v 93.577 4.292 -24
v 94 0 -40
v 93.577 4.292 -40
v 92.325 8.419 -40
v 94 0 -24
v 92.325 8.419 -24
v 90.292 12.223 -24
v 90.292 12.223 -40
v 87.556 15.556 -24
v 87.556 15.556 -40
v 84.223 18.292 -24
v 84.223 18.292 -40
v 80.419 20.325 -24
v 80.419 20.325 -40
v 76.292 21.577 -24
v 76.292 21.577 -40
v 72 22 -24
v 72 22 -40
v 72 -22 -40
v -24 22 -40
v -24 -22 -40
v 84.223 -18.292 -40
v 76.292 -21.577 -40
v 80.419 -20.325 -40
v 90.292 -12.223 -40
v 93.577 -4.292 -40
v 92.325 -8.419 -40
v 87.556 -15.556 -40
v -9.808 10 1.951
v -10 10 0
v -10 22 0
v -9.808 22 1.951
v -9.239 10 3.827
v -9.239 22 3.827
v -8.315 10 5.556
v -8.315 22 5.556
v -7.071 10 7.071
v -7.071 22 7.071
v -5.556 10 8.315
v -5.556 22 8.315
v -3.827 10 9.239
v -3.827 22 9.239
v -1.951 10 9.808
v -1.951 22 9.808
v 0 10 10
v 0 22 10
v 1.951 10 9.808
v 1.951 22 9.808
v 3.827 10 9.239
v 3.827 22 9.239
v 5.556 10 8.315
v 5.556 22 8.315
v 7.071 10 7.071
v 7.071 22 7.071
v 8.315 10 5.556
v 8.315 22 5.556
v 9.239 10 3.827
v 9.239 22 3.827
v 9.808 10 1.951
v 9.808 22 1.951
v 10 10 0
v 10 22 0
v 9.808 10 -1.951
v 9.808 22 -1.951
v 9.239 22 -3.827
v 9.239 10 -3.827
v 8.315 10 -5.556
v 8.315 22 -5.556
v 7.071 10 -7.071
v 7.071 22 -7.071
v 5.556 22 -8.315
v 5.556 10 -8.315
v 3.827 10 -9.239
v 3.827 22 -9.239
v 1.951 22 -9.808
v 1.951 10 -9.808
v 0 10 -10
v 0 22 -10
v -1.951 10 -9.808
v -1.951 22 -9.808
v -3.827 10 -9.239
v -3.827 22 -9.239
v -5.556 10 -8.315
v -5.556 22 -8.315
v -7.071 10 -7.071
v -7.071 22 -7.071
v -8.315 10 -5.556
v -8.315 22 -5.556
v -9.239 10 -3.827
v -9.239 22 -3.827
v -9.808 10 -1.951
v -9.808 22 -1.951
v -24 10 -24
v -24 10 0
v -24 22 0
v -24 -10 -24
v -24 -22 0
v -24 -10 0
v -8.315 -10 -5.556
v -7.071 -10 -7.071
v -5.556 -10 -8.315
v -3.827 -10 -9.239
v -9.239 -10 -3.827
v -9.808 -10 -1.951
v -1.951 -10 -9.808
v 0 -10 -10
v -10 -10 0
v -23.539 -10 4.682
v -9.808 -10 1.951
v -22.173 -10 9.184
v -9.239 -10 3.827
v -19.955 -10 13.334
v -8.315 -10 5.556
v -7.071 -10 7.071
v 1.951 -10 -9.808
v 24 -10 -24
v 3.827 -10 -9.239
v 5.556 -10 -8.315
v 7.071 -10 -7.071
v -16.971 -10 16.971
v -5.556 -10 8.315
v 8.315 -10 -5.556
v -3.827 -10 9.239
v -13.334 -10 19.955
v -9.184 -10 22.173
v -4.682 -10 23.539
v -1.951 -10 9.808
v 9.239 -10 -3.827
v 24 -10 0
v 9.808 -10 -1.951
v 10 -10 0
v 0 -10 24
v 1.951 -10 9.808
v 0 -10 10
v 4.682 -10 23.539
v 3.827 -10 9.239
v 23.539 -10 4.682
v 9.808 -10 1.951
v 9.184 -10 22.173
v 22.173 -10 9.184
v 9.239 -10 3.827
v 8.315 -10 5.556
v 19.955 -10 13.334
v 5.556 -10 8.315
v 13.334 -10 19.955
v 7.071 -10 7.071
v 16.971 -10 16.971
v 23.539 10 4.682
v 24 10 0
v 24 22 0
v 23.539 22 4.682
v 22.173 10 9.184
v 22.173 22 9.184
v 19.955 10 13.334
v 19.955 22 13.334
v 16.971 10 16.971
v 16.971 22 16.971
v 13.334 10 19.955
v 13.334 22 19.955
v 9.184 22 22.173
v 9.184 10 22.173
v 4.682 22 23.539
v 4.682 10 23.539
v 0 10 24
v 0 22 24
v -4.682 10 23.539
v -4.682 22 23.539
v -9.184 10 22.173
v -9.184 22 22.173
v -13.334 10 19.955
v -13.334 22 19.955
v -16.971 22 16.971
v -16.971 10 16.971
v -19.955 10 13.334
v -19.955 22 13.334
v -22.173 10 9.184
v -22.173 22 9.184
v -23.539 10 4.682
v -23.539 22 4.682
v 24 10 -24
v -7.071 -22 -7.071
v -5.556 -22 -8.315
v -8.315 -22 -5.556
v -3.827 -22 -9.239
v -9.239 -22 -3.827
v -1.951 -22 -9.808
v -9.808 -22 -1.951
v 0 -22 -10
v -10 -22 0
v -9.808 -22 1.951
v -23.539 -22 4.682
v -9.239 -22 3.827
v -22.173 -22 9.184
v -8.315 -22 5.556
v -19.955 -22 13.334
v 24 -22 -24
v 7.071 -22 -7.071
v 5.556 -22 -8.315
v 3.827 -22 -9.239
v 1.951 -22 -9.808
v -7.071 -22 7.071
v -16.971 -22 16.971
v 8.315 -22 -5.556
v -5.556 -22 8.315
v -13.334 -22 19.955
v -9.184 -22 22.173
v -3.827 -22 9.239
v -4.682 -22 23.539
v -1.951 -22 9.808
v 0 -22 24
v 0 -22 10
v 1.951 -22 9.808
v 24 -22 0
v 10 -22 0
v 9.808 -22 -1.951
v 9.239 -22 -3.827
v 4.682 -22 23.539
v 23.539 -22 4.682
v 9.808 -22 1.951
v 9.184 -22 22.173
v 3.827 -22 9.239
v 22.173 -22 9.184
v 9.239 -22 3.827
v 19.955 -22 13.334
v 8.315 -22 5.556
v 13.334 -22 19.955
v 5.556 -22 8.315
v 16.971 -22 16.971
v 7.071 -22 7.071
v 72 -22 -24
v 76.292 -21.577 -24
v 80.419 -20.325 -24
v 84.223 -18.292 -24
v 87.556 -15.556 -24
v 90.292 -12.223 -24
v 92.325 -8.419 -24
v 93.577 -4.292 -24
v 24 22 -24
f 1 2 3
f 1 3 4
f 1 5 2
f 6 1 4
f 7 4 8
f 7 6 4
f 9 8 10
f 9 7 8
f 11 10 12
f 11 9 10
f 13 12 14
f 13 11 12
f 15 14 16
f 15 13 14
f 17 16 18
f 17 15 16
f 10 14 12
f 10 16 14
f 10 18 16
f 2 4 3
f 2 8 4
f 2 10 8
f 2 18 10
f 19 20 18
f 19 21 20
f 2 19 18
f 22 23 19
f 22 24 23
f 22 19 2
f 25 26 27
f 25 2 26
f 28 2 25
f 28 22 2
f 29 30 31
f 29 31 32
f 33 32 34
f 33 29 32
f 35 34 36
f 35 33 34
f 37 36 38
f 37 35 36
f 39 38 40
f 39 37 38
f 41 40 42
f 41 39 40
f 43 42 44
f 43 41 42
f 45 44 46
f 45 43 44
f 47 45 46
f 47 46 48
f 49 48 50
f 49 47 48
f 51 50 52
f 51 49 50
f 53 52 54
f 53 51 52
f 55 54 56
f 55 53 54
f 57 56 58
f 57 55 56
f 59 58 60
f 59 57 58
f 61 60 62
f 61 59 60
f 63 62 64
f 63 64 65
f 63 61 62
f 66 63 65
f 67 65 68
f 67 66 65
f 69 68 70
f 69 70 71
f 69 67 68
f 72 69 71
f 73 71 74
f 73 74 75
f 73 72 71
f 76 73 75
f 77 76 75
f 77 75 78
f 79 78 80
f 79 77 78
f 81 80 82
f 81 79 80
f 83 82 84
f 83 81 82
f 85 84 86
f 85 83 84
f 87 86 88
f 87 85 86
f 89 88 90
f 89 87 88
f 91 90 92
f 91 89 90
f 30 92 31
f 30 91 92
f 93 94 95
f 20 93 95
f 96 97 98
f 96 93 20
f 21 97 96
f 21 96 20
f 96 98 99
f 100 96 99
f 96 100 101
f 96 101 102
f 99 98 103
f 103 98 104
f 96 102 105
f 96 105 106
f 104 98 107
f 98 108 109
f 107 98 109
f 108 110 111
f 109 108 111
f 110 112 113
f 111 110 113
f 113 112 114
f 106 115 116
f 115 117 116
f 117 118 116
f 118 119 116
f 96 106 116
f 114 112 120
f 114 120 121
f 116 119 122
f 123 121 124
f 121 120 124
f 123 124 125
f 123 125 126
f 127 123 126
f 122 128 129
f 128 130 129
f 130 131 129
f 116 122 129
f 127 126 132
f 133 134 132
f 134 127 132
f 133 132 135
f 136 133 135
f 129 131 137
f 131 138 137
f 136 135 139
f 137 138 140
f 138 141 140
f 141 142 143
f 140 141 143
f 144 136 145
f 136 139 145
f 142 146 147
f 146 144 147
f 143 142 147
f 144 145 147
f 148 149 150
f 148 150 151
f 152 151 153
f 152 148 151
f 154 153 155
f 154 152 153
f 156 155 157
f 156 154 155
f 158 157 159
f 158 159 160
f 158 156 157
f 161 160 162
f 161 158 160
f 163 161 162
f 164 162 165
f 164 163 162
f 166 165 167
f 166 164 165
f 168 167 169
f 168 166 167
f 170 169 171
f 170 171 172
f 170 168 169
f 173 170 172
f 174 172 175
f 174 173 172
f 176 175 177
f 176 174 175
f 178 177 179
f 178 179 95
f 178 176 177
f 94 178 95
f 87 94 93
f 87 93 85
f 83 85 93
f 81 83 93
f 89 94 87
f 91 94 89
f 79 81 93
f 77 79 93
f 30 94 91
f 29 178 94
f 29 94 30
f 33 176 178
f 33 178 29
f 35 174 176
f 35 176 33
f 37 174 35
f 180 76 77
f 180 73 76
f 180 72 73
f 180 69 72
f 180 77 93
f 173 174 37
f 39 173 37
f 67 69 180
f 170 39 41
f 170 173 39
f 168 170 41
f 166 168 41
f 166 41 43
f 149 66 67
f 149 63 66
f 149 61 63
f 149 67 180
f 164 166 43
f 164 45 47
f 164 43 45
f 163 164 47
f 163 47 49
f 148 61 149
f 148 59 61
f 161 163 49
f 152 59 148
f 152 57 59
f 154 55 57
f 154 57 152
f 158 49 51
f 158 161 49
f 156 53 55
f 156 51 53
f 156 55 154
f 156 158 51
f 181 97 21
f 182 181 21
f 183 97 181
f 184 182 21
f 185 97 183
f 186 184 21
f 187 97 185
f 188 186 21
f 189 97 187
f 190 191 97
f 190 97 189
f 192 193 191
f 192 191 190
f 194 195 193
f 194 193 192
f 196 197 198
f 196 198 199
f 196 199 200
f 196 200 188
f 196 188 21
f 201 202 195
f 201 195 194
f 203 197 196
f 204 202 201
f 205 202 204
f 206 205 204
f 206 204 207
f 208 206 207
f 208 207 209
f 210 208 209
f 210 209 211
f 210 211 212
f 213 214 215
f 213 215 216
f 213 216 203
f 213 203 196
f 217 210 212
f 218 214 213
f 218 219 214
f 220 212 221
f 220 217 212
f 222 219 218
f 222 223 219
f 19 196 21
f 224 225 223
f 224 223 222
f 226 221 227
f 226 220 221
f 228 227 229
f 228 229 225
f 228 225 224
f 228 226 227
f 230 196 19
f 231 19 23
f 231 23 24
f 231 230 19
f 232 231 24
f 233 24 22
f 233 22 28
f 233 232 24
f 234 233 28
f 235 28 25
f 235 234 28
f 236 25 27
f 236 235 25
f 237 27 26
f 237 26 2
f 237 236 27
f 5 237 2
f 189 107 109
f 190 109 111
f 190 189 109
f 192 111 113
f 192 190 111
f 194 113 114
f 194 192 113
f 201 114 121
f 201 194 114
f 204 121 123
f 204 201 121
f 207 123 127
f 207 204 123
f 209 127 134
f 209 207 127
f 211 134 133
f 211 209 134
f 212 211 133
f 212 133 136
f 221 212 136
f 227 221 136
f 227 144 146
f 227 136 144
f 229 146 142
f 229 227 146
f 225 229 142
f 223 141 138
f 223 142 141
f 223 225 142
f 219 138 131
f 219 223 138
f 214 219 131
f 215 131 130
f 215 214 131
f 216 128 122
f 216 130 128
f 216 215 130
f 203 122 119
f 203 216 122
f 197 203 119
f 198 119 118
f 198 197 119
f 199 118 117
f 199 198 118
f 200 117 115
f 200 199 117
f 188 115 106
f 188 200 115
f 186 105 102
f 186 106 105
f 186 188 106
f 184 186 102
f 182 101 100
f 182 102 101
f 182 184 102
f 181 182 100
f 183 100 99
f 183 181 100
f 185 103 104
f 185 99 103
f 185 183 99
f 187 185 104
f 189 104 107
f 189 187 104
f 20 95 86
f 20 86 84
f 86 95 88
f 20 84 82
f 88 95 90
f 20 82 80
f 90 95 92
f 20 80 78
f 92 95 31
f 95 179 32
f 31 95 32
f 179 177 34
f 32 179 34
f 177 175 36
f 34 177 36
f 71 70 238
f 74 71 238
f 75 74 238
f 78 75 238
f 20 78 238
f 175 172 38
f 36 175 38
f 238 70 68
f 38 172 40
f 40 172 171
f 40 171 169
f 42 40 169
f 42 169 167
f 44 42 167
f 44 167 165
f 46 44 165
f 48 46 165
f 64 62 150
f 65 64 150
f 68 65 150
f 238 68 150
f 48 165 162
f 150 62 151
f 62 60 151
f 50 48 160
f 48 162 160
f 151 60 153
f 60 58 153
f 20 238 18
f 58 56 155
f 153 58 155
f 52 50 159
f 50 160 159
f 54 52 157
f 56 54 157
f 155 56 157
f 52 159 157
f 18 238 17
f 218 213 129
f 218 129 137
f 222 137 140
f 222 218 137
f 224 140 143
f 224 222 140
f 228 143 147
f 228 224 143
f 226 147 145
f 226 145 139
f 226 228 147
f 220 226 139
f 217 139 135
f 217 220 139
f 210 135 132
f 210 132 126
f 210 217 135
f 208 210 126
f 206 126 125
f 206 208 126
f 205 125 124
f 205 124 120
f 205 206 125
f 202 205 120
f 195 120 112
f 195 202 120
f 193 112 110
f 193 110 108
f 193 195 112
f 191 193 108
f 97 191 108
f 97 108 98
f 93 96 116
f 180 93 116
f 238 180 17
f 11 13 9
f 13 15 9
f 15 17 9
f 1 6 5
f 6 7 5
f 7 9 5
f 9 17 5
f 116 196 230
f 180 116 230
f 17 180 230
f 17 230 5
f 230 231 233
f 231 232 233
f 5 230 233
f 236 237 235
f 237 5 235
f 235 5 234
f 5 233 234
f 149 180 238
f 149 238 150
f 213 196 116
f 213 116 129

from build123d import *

# Parameters (mm, degrees)
F0_W          = 70
F0_H          = 16
F1_DEPTH      = 22
F1_DEPTH_BACK = 22
F2_DEPTH      = 10
F2_DEPTH_BACK = 10
F3_R          = 21.99999


# Not quite as in the source:
# - a fillet or chamfer is up to 0.001 mm smaller than in the source, because OpenCascade refuses the exact size


with BuildPart() as f1:
    # F0 (on Front) → F1 (new body, two sides)
    with BuildSketch(Plane.XZ) as f1_sk:
        with BuildLine():
            Line((24, 0), (10, 0))
            ThreePointArc((10, 0), (0, -10), (-10, 0))
            Line((-10, 0), (-24, 0))
            ThreePointArc((-24, 0), (-16.9705627485, -16.9705627485), (0, -24))
            ThreePointArc((0, -24), (16.9705627485, -16.9705627485), (24, 0))
        make_face()
        with BuildLine():
            ThreePointArc((-10, 0), (0, 10), (10, 0))
            Line((10, 0), (24, 0))
            ThreePointArc((24, 0), (0, 24), (-24, 0))
            Line((-24, 0), (-10, 0))
        make_face()
        with BuildLine():
            Line((24, -24), (24, 0))
            ThreePointArc((24, 0), (16.9705627485, -16.9705627485), (0, -24))
            Line((0, -24), (24, -24))
        make_face()
        with BuildLine():
            ThreePointArc((0, -24), (-16.9705627485, -16.9705627485), (-24, 0))
            Line((-24, 0), (-24, -24))
            Line((-24, -24), (0, -24))
        make_face()
        Polygon((24, -24), (0, -24), (-24, -24), (-24, -40), (24, -40), align=None)
        with Locations((59, -32)):
            Rectangle(F0_W, F0_H)
    extrude(amount=F1_DEPTH)
    extrude(f1_sk.sketch, amount=-F1_DEPTH_BACK)

    # F0 (on Front) → F2 (cut, two sides)
    with BuildSketch(Plane.XZ) as f2_sk:
        with BuildLine():
            ThreePointArc((-10, 0), (0, 10), (10, 0))
            Line((10, 0), (24, 0))
            ThreePointArc((24, 0), (0, 24), (-24, 0))
            Line((-24, 0), (-10, 0))
        make_face()
        with BuildLine():
            Line((24, -24), (24, 0))
            ThreePointArc((24, 0), (16.9705627485, -16.9705627485), (0, -24))
            Line((0, -24), (24, -24))
        make_face()
        with BuildLine():
            ThreePointArc((0, -24), (-16.9705627485, -16.9705627485), (-24, 0))
            Line((-24, 0), (-24, -24))
            Line((-24, -24), (0, -24))
        make_face()
        with BuildLine():
            Line((24, 0), (10, 0))
            ThreePointArc((10, 0), (0, -10), (-10, 0))
            Line((-10, 0), (-24, 0))
            ThreePointArc((-24, 0), (-16.9705627485, -16.9705627485), (0, -24))
            ThreePointArc((0, -24), (16.9705627485, -16.9705627485), (24, 0))
        make_face()
    extrude(amount=-F2_DEPTH, mode=Mode.SUBTRACT)
    extrude(f2_sk.sketch, amount=F2_DEPTH_BACK, mode=Mode.SUBTRACT)

    # F3 (radius 22 in the source; OpenCascade refuses exactly that, so slightly less here)
    f3_edges = [f1.edges().sort_by_distance(p)[0] for p in [
        (94, -22, -32),
        (94, 22, -32),
    ]]
    fillet(f3_edges, radius=F3_R)


solid = f1.part
